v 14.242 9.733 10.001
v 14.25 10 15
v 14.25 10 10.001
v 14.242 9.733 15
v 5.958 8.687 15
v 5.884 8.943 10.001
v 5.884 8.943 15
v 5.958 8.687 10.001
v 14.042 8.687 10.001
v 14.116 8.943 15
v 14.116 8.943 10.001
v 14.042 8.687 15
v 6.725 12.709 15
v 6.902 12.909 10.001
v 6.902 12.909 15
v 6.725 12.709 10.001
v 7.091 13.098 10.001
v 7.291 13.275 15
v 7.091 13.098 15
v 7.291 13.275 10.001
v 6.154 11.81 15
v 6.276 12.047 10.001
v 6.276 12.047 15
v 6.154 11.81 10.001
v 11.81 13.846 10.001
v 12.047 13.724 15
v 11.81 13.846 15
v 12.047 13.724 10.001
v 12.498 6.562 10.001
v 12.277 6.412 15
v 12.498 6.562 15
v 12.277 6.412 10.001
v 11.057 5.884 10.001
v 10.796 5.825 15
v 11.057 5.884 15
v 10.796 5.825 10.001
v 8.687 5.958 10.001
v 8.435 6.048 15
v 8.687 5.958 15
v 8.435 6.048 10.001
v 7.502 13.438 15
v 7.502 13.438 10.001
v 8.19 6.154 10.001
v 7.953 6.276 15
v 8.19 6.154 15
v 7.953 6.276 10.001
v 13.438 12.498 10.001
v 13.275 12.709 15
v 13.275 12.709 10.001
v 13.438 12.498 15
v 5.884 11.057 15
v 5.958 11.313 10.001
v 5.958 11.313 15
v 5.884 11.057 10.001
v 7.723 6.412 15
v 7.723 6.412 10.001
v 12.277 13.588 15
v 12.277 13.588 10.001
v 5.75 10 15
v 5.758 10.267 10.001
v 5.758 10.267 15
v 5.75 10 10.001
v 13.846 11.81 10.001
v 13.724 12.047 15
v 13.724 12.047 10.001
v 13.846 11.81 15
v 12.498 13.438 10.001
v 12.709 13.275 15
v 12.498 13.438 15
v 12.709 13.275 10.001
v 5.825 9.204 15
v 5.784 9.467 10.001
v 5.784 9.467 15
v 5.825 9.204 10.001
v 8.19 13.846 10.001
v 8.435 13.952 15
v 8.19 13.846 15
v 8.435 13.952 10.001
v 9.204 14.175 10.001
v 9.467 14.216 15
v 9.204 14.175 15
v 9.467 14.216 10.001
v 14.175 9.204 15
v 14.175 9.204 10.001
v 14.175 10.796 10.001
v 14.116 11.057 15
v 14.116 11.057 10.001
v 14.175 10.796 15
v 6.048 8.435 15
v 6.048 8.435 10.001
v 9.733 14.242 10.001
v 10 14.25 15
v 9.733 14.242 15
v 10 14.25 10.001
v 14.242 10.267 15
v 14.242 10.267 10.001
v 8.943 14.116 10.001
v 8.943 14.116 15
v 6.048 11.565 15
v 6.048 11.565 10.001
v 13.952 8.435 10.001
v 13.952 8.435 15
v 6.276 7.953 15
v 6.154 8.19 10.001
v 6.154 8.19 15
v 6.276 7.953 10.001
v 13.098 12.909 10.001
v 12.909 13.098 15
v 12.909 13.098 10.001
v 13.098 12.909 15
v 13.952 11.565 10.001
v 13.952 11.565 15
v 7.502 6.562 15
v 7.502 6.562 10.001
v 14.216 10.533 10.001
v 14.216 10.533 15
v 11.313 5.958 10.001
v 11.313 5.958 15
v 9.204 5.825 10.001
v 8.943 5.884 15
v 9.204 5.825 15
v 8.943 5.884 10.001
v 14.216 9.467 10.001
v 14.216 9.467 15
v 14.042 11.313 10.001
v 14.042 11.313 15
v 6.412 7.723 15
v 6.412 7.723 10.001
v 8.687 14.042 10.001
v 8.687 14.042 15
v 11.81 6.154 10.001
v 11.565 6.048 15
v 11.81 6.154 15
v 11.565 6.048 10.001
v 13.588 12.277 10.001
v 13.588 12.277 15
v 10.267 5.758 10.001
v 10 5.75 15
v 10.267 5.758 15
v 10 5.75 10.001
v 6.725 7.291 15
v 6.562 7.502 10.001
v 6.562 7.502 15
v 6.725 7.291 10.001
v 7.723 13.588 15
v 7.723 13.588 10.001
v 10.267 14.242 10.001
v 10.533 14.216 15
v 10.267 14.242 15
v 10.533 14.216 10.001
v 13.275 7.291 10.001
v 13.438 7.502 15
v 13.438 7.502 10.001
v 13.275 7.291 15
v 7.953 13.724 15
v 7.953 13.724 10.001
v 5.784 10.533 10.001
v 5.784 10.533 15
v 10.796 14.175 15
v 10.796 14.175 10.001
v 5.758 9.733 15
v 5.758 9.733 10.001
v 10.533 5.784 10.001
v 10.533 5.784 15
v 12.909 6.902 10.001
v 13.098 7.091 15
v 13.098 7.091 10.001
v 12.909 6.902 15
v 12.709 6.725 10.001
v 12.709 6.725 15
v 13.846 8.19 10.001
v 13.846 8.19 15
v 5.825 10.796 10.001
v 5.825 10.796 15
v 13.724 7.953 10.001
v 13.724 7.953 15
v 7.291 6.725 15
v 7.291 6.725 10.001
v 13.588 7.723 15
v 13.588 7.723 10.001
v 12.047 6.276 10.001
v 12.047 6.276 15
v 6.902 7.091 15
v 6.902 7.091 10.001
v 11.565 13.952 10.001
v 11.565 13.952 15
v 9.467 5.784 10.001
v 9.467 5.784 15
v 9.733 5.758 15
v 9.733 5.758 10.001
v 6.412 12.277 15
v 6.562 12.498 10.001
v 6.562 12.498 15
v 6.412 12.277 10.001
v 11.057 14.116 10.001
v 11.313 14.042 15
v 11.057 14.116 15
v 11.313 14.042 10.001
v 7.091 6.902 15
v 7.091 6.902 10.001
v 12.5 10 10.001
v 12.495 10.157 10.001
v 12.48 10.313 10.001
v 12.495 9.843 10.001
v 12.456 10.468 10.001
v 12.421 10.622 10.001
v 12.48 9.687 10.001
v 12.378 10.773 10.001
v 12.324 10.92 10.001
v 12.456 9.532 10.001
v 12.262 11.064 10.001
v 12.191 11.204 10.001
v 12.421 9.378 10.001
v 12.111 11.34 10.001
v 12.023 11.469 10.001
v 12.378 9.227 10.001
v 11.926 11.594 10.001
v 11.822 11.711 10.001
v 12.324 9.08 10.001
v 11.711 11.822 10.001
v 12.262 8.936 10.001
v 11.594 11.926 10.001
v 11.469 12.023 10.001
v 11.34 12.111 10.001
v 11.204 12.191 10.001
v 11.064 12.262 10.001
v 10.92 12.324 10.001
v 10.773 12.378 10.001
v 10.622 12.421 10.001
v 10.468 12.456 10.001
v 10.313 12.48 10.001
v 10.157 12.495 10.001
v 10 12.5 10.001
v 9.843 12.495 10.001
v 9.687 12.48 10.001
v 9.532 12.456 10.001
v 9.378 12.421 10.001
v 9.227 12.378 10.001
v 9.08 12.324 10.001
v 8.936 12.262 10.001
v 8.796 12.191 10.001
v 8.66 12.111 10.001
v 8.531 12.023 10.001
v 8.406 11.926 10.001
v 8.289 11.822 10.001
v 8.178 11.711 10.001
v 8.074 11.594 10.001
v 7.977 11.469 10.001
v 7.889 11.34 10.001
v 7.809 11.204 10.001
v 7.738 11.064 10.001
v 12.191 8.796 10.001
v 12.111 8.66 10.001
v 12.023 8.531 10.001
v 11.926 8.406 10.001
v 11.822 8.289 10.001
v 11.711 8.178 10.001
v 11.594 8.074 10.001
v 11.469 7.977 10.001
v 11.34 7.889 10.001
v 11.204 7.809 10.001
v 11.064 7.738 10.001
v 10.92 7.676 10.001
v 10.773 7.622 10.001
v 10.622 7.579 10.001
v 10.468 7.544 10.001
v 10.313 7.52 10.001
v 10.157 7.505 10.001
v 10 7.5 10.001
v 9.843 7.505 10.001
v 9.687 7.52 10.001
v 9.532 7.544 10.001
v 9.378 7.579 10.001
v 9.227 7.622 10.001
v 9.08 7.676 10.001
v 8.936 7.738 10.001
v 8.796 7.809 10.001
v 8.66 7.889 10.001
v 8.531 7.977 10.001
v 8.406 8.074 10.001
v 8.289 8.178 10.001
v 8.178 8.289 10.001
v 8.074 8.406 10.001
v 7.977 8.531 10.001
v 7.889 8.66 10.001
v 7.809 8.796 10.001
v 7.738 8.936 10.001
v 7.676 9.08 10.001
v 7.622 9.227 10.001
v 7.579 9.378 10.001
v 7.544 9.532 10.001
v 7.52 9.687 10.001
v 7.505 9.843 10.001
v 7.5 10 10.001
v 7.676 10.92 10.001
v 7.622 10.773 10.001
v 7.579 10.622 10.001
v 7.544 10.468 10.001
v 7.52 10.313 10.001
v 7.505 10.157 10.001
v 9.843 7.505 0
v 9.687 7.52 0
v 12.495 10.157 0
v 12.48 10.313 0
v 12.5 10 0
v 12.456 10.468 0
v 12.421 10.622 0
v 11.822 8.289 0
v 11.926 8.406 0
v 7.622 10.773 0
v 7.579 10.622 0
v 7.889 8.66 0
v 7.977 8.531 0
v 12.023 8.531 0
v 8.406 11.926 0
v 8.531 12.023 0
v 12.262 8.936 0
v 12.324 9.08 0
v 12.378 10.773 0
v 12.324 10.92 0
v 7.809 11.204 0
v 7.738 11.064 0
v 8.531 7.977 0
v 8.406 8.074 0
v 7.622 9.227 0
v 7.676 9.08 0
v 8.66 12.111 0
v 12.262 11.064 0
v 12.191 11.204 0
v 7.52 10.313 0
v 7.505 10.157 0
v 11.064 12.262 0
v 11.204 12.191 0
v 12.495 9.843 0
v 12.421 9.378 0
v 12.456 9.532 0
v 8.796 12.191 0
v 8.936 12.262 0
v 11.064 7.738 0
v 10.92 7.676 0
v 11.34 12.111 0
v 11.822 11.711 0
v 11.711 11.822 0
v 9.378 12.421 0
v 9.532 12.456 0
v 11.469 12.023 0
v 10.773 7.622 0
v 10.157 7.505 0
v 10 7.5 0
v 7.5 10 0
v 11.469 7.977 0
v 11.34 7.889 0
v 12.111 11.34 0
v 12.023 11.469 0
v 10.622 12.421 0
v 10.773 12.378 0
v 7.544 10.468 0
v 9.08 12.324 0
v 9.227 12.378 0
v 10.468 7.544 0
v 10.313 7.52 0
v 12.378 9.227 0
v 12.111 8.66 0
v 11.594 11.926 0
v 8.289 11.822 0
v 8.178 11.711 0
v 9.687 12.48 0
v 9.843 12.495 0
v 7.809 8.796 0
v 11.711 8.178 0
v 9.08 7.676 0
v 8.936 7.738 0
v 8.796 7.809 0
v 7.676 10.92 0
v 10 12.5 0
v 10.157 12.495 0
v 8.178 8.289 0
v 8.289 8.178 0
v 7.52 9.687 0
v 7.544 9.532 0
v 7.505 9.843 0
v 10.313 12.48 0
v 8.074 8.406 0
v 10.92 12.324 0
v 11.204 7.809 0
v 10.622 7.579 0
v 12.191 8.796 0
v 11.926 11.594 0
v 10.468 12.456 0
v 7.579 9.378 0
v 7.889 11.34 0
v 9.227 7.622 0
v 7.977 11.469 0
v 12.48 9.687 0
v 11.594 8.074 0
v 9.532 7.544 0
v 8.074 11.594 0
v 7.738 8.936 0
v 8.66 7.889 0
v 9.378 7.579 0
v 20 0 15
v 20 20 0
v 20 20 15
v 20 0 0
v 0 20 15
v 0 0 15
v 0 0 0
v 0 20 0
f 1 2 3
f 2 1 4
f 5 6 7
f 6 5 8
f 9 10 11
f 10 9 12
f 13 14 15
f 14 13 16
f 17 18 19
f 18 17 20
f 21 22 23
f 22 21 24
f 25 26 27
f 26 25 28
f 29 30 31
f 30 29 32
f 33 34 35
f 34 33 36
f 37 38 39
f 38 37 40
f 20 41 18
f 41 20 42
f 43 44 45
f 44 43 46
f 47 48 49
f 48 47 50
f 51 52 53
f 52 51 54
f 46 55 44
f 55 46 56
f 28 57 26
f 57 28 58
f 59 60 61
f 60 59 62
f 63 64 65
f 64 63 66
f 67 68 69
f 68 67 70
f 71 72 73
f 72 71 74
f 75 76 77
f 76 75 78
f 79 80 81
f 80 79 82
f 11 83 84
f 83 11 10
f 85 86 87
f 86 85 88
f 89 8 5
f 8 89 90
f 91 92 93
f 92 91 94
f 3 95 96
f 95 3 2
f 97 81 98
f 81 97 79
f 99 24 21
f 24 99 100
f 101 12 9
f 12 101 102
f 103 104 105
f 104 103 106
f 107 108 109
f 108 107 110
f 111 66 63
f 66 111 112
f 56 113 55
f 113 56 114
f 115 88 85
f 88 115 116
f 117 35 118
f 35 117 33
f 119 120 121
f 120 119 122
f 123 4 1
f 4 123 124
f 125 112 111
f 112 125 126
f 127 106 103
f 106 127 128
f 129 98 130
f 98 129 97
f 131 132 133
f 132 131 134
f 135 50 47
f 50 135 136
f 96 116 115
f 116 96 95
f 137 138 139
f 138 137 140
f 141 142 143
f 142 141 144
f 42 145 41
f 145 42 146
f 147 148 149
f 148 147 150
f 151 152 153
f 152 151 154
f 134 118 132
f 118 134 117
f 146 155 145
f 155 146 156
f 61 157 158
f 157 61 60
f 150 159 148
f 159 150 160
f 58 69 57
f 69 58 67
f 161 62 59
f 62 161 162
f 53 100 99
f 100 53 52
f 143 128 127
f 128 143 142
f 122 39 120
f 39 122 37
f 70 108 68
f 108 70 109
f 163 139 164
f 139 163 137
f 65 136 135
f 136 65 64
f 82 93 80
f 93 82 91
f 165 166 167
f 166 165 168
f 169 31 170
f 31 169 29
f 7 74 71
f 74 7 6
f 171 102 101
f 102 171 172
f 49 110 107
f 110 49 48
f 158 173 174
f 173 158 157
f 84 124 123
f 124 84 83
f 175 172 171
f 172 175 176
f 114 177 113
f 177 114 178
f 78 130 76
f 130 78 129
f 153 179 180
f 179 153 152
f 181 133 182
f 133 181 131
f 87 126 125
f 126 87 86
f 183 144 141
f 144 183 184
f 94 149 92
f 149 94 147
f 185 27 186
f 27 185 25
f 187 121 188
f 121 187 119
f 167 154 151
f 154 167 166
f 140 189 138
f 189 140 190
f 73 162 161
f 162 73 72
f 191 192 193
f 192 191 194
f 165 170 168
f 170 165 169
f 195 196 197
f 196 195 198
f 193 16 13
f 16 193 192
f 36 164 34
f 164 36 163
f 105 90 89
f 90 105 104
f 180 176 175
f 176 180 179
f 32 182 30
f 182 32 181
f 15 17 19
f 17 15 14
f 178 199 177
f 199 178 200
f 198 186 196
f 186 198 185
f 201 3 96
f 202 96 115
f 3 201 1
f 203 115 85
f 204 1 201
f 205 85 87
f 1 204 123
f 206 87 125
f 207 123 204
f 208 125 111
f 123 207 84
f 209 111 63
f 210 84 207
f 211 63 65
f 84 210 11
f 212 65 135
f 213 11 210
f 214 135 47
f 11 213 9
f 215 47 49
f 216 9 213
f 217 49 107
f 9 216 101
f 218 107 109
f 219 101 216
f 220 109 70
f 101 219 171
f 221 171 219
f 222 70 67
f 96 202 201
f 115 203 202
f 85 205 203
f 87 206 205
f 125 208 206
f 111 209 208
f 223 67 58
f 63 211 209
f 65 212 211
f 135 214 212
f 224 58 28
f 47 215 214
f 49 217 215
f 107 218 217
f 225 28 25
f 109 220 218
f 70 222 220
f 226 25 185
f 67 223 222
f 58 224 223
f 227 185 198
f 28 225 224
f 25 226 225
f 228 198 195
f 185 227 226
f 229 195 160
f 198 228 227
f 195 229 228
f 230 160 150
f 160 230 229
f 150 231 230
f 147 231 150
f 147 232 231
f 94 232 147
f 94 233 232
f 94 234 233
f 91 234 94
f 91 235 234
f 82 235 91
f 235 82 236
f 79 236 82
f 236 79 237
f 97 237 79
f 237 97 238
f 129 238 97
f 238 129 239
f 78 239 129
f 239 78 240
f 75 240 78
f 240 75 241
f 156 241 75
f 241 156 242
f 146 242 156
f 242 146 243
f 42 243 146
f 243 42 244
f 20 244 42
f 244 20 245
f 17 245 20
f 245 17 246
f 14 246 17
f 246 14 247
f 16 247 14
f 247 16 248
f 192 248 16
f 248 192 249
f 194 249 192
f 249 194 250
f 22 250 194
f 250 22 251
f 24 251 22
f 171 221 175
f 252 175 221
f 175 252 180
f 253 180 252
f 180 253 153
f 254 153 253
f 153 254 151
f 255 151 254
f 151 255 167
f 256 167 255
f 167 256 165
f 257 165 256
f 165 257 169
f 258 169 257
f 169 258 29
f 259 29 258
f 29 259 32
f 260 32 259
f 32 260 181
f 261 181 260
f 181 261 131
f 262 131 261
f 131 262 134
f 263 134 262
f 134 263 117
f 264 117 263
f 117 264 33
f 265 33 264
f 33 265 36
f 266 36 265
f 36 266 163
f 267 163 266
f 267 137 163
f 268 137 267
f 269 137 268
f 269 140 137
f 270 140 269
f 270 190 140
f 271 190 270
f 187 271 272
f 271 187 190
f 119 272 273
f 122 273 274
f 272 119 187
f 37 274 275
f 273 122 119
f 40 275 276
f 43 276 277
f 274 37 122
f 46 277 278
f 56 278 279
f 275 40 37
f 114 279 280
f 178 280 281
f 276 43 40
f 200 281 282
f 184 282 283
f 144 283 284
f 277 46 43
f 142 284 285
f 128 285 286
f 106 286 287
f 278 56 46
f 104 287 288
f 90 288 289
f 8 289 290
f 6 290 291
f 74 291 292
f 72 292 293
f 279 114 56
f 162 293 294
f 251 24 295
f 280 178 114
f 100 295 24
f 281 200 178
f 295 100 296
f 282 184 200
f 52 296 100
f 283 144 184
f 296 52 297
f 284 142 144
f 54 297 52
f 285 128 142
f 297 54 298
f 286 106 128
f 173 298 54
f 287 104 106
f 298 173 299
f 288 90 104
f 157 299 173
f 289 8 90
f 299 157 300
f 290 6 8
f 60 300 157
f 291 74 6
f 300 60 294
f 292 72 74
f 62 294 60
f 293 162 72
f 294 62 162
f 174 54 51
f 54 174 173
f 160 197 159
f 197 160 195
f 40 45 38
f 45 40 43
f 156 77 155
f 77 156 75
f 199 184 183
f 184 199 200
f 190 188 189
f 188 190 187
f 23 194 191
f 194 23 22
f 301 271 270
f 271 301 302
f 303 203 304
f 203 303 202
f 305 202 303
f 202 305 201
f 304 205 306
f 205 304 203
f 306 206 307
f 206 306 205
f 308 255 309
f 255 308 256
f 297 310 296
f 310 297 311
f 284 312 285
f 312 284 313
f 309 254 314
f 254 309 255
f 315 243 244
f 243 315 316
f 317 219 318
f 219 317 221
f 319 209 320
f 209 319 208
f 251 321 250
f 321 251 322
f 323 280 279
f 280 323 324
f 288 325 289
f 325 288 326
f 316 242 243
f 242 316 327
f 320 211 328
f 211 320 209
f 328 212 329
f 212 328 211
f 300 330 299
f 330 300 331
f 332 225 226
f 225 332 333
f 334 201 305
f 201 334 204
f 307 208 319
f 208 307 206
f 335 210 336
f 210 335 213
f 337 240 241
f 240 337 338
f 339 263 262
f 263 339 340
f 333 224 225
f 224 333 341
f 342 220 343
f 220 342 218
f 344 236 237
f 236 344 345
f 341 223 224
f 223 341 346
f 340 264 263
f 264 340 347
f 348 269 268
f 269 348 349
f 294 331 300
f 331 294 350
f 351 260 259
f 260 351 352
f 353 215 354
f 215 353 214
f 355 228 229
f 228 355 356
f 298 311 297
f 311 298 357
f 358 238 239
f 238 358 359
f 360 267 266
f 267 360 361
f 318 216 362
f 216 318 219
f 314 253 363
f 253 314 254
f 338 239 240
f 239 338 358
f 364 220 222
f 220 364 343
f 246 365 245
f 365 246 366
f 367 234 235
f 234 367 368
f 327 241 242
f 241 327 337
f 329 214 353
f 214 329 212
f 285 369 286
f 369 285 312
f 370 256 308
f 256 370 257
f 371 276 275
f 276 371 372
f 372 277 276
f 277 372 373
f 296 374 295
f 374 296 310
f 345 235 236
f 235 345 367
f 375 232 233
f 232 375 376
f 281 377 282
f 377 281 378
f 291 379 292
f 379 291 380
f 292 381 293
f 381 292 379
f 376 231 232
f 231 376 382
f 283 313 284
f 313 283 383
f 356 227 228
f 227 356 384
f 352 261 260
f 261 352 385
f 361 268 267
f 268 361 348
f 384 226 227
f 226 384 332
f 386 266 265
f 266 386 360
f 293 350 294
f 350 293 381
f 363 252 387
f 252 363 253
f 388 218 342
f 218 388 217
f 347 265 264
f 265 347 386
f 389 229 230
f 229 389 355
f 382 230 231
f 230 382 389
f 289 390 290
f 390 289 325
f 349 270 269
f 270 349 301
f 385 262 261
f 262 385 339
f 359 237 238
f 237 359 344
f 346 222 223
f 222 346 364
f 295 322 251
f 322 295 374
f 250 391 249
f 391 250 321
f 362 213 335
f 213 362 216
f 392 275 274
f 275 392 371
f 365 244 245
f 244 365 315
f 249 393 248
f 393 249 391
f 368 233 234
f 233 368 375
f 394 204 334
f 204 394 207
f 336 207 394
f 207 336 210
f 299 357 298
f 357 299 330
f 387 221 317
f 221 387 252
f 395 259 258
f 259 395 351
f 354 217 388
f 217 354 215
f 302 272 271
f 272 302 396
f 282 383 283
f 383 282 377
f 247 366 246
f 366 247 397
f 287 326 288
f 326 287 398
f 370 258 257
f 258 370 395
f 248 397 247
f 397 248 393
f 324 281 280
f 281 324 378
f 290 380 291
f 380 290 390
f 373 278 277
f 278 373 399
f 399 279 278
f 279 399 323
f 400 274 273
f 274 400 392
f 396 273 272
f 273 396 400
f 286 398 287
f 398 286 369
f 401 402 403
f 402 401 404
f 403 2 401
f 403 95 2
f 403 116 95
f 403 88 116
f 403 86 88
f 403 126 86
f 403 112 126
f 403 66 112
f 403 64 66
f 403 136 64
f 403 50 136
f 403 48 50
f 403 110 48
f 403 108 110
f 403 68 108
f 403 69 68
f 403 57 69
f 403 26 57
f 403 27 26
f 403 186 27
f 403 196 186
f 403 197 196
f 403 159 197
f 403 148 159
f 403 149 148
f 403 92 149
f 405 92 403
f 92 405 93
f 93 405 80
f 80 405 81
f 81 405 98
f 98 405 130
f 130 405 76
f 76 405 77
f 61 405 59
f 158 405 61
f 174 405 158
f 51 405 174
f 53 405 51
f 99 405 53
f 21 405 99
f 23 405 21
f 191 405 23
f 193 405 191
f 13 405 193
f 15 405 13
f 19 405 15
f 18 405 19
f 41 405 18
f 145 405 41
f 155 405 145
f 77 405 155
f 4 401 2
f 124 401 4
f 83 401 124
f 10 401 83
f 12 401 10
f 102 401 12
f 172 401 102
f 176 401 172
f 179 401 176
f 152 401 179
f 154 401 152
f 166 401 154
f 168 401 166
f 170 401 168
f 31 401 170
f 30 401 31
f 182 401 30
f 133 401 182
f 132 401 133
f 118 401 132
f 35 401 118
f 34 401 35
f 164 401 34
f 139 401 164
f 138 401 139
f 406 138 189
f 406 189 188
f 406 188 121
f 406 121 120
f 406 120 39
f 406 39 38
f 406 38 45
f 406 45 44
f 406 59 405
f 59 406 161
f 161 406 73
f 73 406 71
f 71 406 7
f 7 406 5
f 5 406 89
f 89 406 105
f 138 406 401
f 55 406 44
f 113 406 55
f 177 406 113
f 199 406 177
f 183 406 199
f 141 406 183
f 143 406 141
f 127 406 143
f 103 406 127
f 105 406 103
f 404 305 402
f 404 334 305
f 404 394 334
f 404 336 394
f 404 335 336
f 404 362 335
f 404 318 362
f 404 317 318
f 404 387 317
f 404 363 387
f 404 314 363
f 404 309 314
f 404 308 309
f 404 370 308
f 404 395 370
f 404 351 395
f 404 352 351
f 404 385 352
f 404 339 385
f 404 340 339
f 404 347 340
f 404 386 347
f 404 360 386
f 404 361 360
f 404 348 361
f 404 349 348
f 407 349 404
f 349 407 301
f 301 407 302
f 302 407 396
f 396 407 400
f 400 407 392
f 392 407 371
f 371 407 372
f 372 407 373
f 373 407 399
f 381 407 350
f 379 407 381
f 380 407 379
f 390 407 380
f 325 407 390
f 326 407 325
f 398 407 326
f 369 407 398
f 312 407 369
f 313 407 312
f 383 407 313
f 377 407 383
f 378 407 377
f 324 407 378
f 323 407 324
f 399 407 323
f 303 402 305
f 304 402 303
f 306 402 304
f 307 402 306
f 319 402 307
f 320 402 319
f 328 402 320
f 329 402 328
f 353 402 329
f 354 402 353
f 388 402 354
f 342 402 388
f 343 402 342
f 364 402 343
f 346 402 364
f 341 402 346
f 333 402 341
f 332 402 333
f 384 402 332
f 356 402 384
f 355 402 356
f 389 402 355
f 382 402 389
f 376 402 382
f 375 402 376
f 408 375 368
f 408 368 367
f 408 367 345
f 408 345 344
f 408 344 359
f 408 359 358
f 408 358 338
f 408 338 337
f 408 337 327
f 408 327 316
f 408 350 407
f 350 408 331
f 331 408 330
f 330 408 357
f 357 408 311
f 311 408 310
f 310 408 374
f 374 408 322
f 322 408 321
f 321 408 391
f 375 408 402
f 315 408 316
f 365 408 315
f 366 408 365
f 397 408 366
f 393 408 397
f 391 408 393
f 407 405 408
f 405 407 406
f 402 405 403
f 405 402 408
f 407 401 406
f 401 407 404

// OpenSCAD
// file: ScrewsMetric/Internal/ScrewsMetric-core-NutSelector.scad
//Copyright 2017 Robert Witts
//This library is licensed under the LGPL 3.0 See http://creativecommons.org/licenses/LGPL/3.0/
include<ScrewsMetric-core-modules.scad>;
fullNut = 0;
nylocNut = 1;
domeNut = 2;
thinSquareNut = 3;
studdingConnector = 4;
squareNut = 5;
wingNut = 6;
wingNutAllowTurn = 7;

function isNutInScrewsMetric(nutType, size) = nutType == fullNut? isValueInScrewsMetric(size, fullNutH):
nutType == nylocNut? isValueInScrewsMetric(size, nylocNutH):
nutType == domeNut? isValueInScrewsMetric(size, domeNutTotalH):
nutType == thinSquareNut? isValueInScrewsMetric(size, thinSquareNutH):
nutType == studdingConnector? isValueInScrewsMetric(size, studdingConnectorNutL):
nutType == squareNut? isValueInScrewsMetric(size, squareNutH):
nutType == wingNut? isValueInScrewsMetric(size, wingNutWingH):
nutType == wingNutAllowTurn? isValueInScrewsMetric(size, wingNutWingH):
ScrewsMetric_nut_type_does_not_exist___Try_another_type();

function M_getNutH(nutType, size) = nutType == fullNut? M(size, fullNutH):
nutType == nylocNut? M(size, nylocNutH):
nutType == domeNut? M(size, domeNutTotalH):
nutType == thinSquareNut? M(size, thinSquareNutH):
nutType == studdingConnector? M(size, studdingConnectorNutL):
nutType == squareNut? M(size, squareNutH):
nutType == wingNut? M(size, wingNutWingH):
nutType == wingNutAllowTurn? M(size, wingNutWingH):
ScrewsMetric_nut_type_does_not_exist___Try_another_type();

function M_getNutSideH(nutType, size) = nutType == fullNut? M(size, fullNutH):
nutType == nylocNut? M(size, fullNutH):
nutType == domeNut? M(size, domeNutHexH):
nutType == thinSquareNut? M(size, thinSquareNutH):
nutType == studdingConnector? M(size, studdingConnectorNutL):
nutType == squareNut? M(size, squareNutH):
nutType == wingNut? M(size, wingNutBaseH):
nutType == wingNutAllowTurn? M(size, wingNutBaseH):
ScrewsMetric_nut_type_does_not_exist___Try_another_type();

function M_getNutPeakD(nutType, size) = nutType == fullNut? M(size, nutPeakD):
nutType == nylocNut? M(size, nutPeakD):
nutType == domeNut? M(size, nutPeakD):
nutType == thinSquareNut? M(size, squareNutPeakD):
nutType == studdingConnector? M(size, nutPeakD):
nutType == squareNut? M(size, squareNutPeakD):
nutType == wingNut? M(size, wingNutWingExtension):
nutType == wingNutAllowTurn? M(size, wingNutWingExtension):
ScrewsMetric_nut_type_does_not_exist___Try_another_type();

function M_getNutFlatD(nutType, size) = nutType == fullNut? M(size, nutFlatD):
nutType == nylocNut? M(size, nutFlatD):
nutType == domeNut? M(size, nutFlatD):
nutType == thinSquareNut? M(size, squareNutFlatD):
nutType == studdingConnector? M(size, nutFlatD):
nutType == squareNut? M(size, squareNutPeakD):
nutType == wingNut? M(size, wingNutBaseD):
nutType == wingNutAllowTurn? M(size, wingNutWingExtension):
ScrewsMetric_nut_type_does_not_exist___Try_another_type();

function ScrewsMetric_nut_type_does_not_exist___Try_another_type() = SG_proceedOnError?undef:ScrewsMetric_nut_type_does_not_exist___Try_another_type();

module M_Nut(nutType, size, ERR = 0, hollow = false, VertERR=0){
   if(nutType == fullNut){
      M_FullNut(size, ERR, hollow, VertERR);
   } else if(nutType == nylocNut){
      M_NylocNut(size, ERR, hollow, VertERR);
   } else if(nutType == domeNut){
      M_DomeNut(size, ERR, hollow, VertERR);
   } else if(nutType == thinSquareNut){
      M_ThinSquareNut(size, ERR, hollow, VertERR);
   } else if(nutType == studdingConnector){
      M_StuddingConnector(size, ERR, hollow, VertERR);
   } else if(nutType == squareNut){
      M_SquareNut(size, ERR, hollow, VertERR);
   } else if(nutType == wingNut){
      M_WingNutLocked(size, ERR, hollow, VertERR);
   } else if(nutType == wingNutAllowTurn){
      M_WingNutRotatable(size, ERR, hollow, VertERR);
   } else {
      echo("ERROR: Nut type not recognised, proceding with default nut");
      M_FullNut(size, length, ERR, hollow, VertERR);
   }
}
module M_NutHole(nutType, size, depth, ERR = 0, VertERR=0){
   if(nutType == fullNut){
      M_FullNutHole(size, depth, ERR, VertERR);
   } else if(nutType == nylocNut){
      M_NylocNutHole(size, depth, ERR, VertERR);
   } else if(nutType == domeNut){
      M_DomeNutHole(size, depth, ERR, VertERR);
   } else if(nutType == thinSquareNut){
      M_ThinSquareNutHole(size, depth, ERR, VertERR);
   } else if(nutType == studdingConnector){
      M_StuddingConnectorHole(size, depth, ERR, VertERR);
   } else if(nutType == squareNut){
      M_SquareNutHole(size, depth, ERR, VertERR);
   } else if(nutType == wingNut){
      M_WingNutLockedHole(size, depth, ERR, VertERR);
   } else if(nutType == wingNutAllowTurn){
      echo("WARNING: There is no way you would want a wing nut to be rotatable when immbedded in something, so the system will make it fixed, to remove this error, use wingNut as opposed to wingNutAllowTurn");
      M_WingNutRotatable(size, depth, ERR, VertERR);
   } else {
      echo("ERROR: Nut type not recognised, proceding with default nut");
      M_FullNut(size, length, ERR, VertERR);
   }
}
// file: ScrewsMetric/Internal/ScrewsMetric-NutSelector.scad
//Copyright 2017 Robert Witts
//This library is licensed under the LGPL 3.0 See http://creativecommons.org/licenses/LGPL/3.0/
include<ScrewsMetric-core-NutSelector.scad>;
function isNutInScrewsSystem(nutType, size) = isNutInScrewsMetric(nutType, size);
function getNutH(nutType, size) = M_getNutH(nutType, size);
function getNutSideH(nutType, size) = M_getNutSideH(nutType, size);
function getNutPeakD(nutType, size) = M_getNutPeakD(nutType, size);
function getNutFlatD(nutType, size) = M_getNutFlatD(nutType, size);
module Nut(nutType, size, ERR = 0, hollow = false, VertERR=0){
   M_Nut(nutType, size, ERR, hollow, VertERR);
}
module NutHole(nutType, size, depth, ERR = 0, VertERR=0){
   M_NutHole(nutType, size, depth, ERR, VertERR);
}
echo("ScrewsMetric Nut types: 'fullNut' 'nylocNut' 'domeNut' 'thinSquareNut' 'studdingConnector' 'squareNut' 'wingNut' 'wingNutAllowTurn' \n");
// file: ScrewsMetric/Internal/ScrewsMetric-Washers.scad
//Copyright 2017 Robert Witts
//This library is licensed under the LGPL 3.0 See http://creativecommons.org/licenses/LGPL/3.0/
include<ScrewsMetric-core-Washers.scad>;

function WasherDimensions(a, b, c) = M_WasherDimensions(a, b, c);

function isValueInWasherDatabase(a, b, c) = isValueInScrewsMetricWasher(a, b, c);

function getWasherT(a, b) = M_getWasherT(a, b);
function getWasherOuterD(a, b) = M_getWasherOuterD(a, b);

module Washer(form, size, ERR = 0, hollow = false, VertERR = 0){
   M_Washer(form, size, ERR, hollow, VertERR);
}
echo("ScrewsMetric Washer system loaded: Washer forms A-G available, e.g. washerFormA\nTo create a washer use Washer(form, size);\nSpecific washers can also be created, but this is not reccomended, e.g. FormAWasher(size);\nTo access values in the database, use WasherDimensions(size, form, value), which contains washerT and washerOuterD\ngetWasherT(size, form) and getWasherOuterD(size, form) are shortcuts to this function\n");
// file: ScrewsMetric/Internal/ScrewsMetric-BoltSelector.scad
//Copyright 2017 Robert Witts
//This library is licensed under the LGPL 3.0 See http://creativecommons.org/licenses/LGPL/3.0/
include<ScrewsMetric-core-BoltSelector.scad>;

function isBoltInScrewsSystem(boltType, size) = isBoltInScrewsMetric(boltType, size);
function getHeadDiameter(boltType, size) = M_getHeadDiameter(boltType, size);
function getHeadHeight(boltType, size) = M_getHeadHeight(boltType, size);

module BoltOnSurface(boltType, size, length, ERR=0, hollow = false, silent = false){
    M_BoltOnSurface(boltType, size, length, ERR, hollow, silent);
}
module BoltFlushWithSurface(boltType, size, length, ERR=0, hollow = false, override = false, silent = false){
   M_BoltFlushWithSurface(boltType, size, length, ERR, hollow, override, silent);
}
module BoltNormalWithSurface(boltType, size, length, ERR=0, hollow = false, silent = false){
   M_BoltNormalWithSurface(boltType, size, length, ERR, hollow, silent);
}
module BoltInHoleFromTop(boltType, size, length, holeDepth, ERR=0, hollow = false, silent = false){
   M_BoltInHoleFromTop(boltType, size, length, holeDepth, ERR, hollow, silent);
}
module BoltInHoleFromBottom(boltType, size, length, holeDepth, ERR=0, hollow = false, silent = false){
   M_BoltInHoleFromBottom(boltType, size, length, holeDepth, ERR, hollow, silent);
}
module BoltInHoleFromNormal(boltType, size, length, holeDepth, ERR=0, hollow = false, silent = false){
   M_BoltInHoleFromNormal(boltType, size, length, holeDepth, ERR, hollow, silent);
}
echo("ScrewsMetric Bolt types: \'allenBolt\' \'allenButtonBolt\' \'allenCountersunkBolt\' \'hexHeadBolt\' \'hexFlangeBolt\' \'hexHeadBoltAllowSpin\'\n");
echo("ScrewsMetric bolt system utility functions: \'getHeadDiameter\' \'getHeadHeight\'");
echo("ScrewsMetric bolt system modules:  \'BoltOnSurface\' \'BoltFlushWithSurface\' \'BoltNormalWithSurface\' \'BoltInHoleFromTop\' \'BoltInHoleFromBottom\' \'BoltInHoleFromDefault\' \'BoltInHoleFromNormal\'\n");
// file: ScrewsMetric/Internal/ScrewsMetric-Modules.scad
//Copyright 2017 Robert Witts
//This library is licensed under the LGPL 3.0 See http://creativecommons.org/licenses/LGPL/3.0/
include<ScrewsMetric-core-modules.scad>;
module AllenBolt(size, length, ERR=0,hollow = false){
   M_AllenBolt(size, length, ERR,hollow);
}
module AllenBoltHole(size, length, holeDepth, ERR=0,hollow = false){
   M_AllenBoltHole(size, length, holeDepth, ERR,hollow);
}
module AllenButtonBolt(size, length, ERR=0,hollow = false){
   M_AllenButtonBolt(size, length, ERR,hollow);
}
module AllenButtonBoltHole(size, length, holeDepth, ERR=0,hollow = false){
   M_AllenButtonBoltHole(size, length, holeDepth, ERR,hollow);
}
module AllenCountersunkBolt(size, length, ERR=0,hollow = false){
   M_AllenCountersunkBolt(size, length, ERR,hollow);
}
module AllenCountersunkBoltHole(size, length, holeDepth, ERR=0,hollow = false){
   M_AllenCountersunkBoltHole(size, length, holeDepth, ERR,hollow);
}
module HexHeadBolt(size, length, ERR=0,hollow = false){
   M_HexHeadBolt(size, length, ERR,hollow);
}
module HexHeadBoltHole(size, length, holeDepth, ERR=0,hollow = false){
   M_HexHeadBoltHole(size, length, holeDepth, ERR,hollow);
}
module HexHeadBoltHoleAllowingSpin(size, length, holeDepth, ERR=0,hollow = false){
   M_HexHeadBoltHoleAllowingSpin(size, length, holeDepth, ERR,hollow);
}
module HexHeadFlangeBoltHole(size, length, holeDepth, ERR=0,hollow = false){
   M_HexHeadFlangeBoltHole(size, length, holeDepth, ERR,hollow);
}
module HexHeadFlangeBolt(size, length, ERR=0,hollow = false){
   M_HexHeadFlangeBolt(size, length, ERR,hollow);
}
module ThinSquareNut(size, ERR=0,hollow = false, VertERR=0){
   M_ThinSquareNut(size, ERR,hollow, VertERR);
}
module SquareNut(size, ERR=0,hollow = false, VertERR=0){
   M_SquareNut(size, ERR,hollow, VertERR);
}
module StuddingConnector(size, ERR=0,hollow = false, VertERR=0){
   M_StuddingConnector(size, ERR,hollow, VertERR);
}
module FullNut(size, ERR=0,hollow = false, VertERR=0){
   M_FullNut(size, ERR,hollow, VertERR);
}
module NylockNut(size, ERR=0,hollow = false, VertERR=0){
   M_NylockNut(size, ERR,hollow, VertERR);
}
module DomeNut(size, ERR=0,hollow = false, VertERR=0){
   M_DomeNut(size, ERR,hollow, VertERR);
}

module Rod(size, length, ERR=0, hollow = false){
   M_Rod(size, length, ERR=0, hollow = false);
}

module FullNutHole(size, distFromEdge, ERR=0, VertERR=0){
   M_FullNutHole(size, distFromEdge, ERR, VertERR);
}
module DomeNutHole(size, distFromEdge, ERR=0, VertERR=0){
   M_DomeNutHole(size, distFromEdge, ERR, VertERR);
}
module NylockNutHole(size, distFromEdge, ERR=0, VertERR=0){
   M_NylockNutHole(size, distFromEdge, ERR, VertERR);
}
module ThinSquareNutHole(size, distFromEdge, ERR=0, VertERR=0){
   M_ThinSquareNutHole(size, distFromEdge, ERR, VertERR);
}
module SquareNutHole(size, distFromEdge, ERR=0, VertERR=0){
   M_SquareNutHole(size, distFromEdge, ERR, VertERR);
}


module WingNutLockedHole(size, distFromEdge, ERR=0, VertERR=0){
   M_WingNutLockedHole(size, distFromEdge, ERR, VertERR);
}
module WingNutLocked(size, ERR=0, hollow = false, VertERR=0){
   M_WingNutLocked(size, ERR, hollow, VertERR);
}
module WingNutRotatable(size, ERR=0, hollow = false, VertERR=0){
   M_WingNutRotatable(size, ERR, hollow, VertERR);
}
echo("ScrewsMetric basic modules: 'AllenBolt' 'AllenBoltHole' 'HexHeadBolt' 'HexHeadBoltHole' 'HexHeadBoltHoleAllowingSpin' 'HexHeadFlangeBolt' 'HexHeadFlangeBoltHole' 'ThinSquareNut' 'SquareNut' 'StuddingConnector' 'FullNut' 'NylockNut' 'DomeNut' 'Rod' 'ThinSquareNutHole' 'SquareNutHole' 'StuddingConnectorHole' 'FullNutHole' 'NylockNutHole' 'DomeNutHole' 'AllenButtonBolt' 'AllenButtonBoltHole' 'AllenCountersunkBolt' 'AllenCountersunkBoltHole' 'WingNutLocked' 'WingNutRotatable' 'WingNutLockedHole' \n");
// file: ScrewsMetric/Internal/ScrewsMetric-Base.scad
//Copyright 2017 Robert Witts
//This library is licensed under the LGPL 3.0 See http://creativecommons.org/licenses/LGPL/3.0/
include<ScrewsMetric-core.scad>;

mm = 1;
inches = 25.4;
Units = mm;

function isValueInScrewsDatabase(a, b) = isValueInScrewsMetric(a, b);

function getRodD(a) = M_getRodD(a);

echo("ScrewsMetric is active, this will provide a set of values for you programmes to use, for creating holes for metric parts, such as bolts, if you want UNC bolts, then use ScrewsUNC instead, for both, use ScrewsUniversal, but do not use the individual ones. By default the system will work in mm, to change this use Units = inches;\n");
echo("The wing nuts in this system are of the american kind, with square ends to the wings, if you are not using these, please be careful, as yours may not fit.\n");

echo("ScrewsMetric available values: 'ScrewsMetric_name', 'boltD', 'nutFlatD', 'nutPeakD', 'fullNutH', 'domeNutHexH', 'domeNutTotalH', 'allenBoltHeadD', 'allenBoltHeadH', 'nylocNutH''', 'studdingConnectorNutL', 'squareNutFlatD', 'squareNutPeakD', 'thinSquareNutH', 'hexHeadBoltHeadH', 'hexFlangeHeadH', 'hexHeadFlatD', 'hexHeadPeakD', 'hexFlangeT', 'hexFlangeD', 'allenBoltKeySize', 'allenButtonBoltKeySize', 'allenCountersunkBoltKeySize', 'allenButtonBoltHeadD', 'allenButtonBoltHeadH', 'allenCountersunkBoltHeadD', 'allenCountersunkBoltHeadH' 'squareNutH' 'wingNutBaseH' 'wingNutBaseD' 'wingNutWingT' 'wingNutWingExtension' 'wingNutWingH' \n");
// file: ScrewsMetric/ScrewsMetric.scad
//Copyright 2017 Robert Witts
//This library is licensed under the LGPL 3.0 See http://creativecommons.org/licenses/LGPL/3.0/
include <Internal/ScrewsMetric-Base.scad>;
include <Internal/ScrewsMetric-Modules.scad>;
include <Internal/ScrewsMetric-BoltSelector.scad>;
include <Internal/ScrewsMetric-Washers.scad>;
include <Internal/ScrewsMetric-NutSelector.scad>;
// main file
//Copyright 2017 Robert Witts
//This library is licensed under the LGPL 3.0 See http://creativecommons.org/licenses/LGPL/3.0/
include <ScrewsMetric/ScrewsMetric.scad>;
H = 15;
W = 20;
L = 20;
boltSize = M5;
boltType = allenBolt;

nutType = fullNut;

washerForm = washerFormA;

$fn = 100;
GHOST = true;


module demo1(){
   difference(){
      cube([L, W, H]);
      translate([L/2, W/2, H+0.001])BoltNormalWithSurface(boltType, boltSize, H+0.002);
   }
}
module demo2(){
   difference(){
      cube([L, W, H]);
      translate([L/2, W/2, H+0.001])BoltNormalWithSurface(boltType, boltSize, H+0.002);
      translate([L/2, W/2, getNutSideH(nutType, boltSize)-0.001])rotate([180, 0, 0])Nut(nutType, boltSize);
   }
}
module demo3(){
   difference(){
      cube([L, W, H]);
      translate([L/2, -0.001, H/2])rotate([90, 0, 0])BoltOnSurface(boltType, boltSize, W+0.002);
      translate([L/2, W/2+getNutH(nutType, boltSize)/2, H/2])rotate([90, 90, 0])NutHole(nutType, boltSize, H/2+0.001);
      translate([L/2, -0.001, H/2])rotate([-90, 0, 0])Washer(washerForm, boltSize);
   }
}


demo1();
